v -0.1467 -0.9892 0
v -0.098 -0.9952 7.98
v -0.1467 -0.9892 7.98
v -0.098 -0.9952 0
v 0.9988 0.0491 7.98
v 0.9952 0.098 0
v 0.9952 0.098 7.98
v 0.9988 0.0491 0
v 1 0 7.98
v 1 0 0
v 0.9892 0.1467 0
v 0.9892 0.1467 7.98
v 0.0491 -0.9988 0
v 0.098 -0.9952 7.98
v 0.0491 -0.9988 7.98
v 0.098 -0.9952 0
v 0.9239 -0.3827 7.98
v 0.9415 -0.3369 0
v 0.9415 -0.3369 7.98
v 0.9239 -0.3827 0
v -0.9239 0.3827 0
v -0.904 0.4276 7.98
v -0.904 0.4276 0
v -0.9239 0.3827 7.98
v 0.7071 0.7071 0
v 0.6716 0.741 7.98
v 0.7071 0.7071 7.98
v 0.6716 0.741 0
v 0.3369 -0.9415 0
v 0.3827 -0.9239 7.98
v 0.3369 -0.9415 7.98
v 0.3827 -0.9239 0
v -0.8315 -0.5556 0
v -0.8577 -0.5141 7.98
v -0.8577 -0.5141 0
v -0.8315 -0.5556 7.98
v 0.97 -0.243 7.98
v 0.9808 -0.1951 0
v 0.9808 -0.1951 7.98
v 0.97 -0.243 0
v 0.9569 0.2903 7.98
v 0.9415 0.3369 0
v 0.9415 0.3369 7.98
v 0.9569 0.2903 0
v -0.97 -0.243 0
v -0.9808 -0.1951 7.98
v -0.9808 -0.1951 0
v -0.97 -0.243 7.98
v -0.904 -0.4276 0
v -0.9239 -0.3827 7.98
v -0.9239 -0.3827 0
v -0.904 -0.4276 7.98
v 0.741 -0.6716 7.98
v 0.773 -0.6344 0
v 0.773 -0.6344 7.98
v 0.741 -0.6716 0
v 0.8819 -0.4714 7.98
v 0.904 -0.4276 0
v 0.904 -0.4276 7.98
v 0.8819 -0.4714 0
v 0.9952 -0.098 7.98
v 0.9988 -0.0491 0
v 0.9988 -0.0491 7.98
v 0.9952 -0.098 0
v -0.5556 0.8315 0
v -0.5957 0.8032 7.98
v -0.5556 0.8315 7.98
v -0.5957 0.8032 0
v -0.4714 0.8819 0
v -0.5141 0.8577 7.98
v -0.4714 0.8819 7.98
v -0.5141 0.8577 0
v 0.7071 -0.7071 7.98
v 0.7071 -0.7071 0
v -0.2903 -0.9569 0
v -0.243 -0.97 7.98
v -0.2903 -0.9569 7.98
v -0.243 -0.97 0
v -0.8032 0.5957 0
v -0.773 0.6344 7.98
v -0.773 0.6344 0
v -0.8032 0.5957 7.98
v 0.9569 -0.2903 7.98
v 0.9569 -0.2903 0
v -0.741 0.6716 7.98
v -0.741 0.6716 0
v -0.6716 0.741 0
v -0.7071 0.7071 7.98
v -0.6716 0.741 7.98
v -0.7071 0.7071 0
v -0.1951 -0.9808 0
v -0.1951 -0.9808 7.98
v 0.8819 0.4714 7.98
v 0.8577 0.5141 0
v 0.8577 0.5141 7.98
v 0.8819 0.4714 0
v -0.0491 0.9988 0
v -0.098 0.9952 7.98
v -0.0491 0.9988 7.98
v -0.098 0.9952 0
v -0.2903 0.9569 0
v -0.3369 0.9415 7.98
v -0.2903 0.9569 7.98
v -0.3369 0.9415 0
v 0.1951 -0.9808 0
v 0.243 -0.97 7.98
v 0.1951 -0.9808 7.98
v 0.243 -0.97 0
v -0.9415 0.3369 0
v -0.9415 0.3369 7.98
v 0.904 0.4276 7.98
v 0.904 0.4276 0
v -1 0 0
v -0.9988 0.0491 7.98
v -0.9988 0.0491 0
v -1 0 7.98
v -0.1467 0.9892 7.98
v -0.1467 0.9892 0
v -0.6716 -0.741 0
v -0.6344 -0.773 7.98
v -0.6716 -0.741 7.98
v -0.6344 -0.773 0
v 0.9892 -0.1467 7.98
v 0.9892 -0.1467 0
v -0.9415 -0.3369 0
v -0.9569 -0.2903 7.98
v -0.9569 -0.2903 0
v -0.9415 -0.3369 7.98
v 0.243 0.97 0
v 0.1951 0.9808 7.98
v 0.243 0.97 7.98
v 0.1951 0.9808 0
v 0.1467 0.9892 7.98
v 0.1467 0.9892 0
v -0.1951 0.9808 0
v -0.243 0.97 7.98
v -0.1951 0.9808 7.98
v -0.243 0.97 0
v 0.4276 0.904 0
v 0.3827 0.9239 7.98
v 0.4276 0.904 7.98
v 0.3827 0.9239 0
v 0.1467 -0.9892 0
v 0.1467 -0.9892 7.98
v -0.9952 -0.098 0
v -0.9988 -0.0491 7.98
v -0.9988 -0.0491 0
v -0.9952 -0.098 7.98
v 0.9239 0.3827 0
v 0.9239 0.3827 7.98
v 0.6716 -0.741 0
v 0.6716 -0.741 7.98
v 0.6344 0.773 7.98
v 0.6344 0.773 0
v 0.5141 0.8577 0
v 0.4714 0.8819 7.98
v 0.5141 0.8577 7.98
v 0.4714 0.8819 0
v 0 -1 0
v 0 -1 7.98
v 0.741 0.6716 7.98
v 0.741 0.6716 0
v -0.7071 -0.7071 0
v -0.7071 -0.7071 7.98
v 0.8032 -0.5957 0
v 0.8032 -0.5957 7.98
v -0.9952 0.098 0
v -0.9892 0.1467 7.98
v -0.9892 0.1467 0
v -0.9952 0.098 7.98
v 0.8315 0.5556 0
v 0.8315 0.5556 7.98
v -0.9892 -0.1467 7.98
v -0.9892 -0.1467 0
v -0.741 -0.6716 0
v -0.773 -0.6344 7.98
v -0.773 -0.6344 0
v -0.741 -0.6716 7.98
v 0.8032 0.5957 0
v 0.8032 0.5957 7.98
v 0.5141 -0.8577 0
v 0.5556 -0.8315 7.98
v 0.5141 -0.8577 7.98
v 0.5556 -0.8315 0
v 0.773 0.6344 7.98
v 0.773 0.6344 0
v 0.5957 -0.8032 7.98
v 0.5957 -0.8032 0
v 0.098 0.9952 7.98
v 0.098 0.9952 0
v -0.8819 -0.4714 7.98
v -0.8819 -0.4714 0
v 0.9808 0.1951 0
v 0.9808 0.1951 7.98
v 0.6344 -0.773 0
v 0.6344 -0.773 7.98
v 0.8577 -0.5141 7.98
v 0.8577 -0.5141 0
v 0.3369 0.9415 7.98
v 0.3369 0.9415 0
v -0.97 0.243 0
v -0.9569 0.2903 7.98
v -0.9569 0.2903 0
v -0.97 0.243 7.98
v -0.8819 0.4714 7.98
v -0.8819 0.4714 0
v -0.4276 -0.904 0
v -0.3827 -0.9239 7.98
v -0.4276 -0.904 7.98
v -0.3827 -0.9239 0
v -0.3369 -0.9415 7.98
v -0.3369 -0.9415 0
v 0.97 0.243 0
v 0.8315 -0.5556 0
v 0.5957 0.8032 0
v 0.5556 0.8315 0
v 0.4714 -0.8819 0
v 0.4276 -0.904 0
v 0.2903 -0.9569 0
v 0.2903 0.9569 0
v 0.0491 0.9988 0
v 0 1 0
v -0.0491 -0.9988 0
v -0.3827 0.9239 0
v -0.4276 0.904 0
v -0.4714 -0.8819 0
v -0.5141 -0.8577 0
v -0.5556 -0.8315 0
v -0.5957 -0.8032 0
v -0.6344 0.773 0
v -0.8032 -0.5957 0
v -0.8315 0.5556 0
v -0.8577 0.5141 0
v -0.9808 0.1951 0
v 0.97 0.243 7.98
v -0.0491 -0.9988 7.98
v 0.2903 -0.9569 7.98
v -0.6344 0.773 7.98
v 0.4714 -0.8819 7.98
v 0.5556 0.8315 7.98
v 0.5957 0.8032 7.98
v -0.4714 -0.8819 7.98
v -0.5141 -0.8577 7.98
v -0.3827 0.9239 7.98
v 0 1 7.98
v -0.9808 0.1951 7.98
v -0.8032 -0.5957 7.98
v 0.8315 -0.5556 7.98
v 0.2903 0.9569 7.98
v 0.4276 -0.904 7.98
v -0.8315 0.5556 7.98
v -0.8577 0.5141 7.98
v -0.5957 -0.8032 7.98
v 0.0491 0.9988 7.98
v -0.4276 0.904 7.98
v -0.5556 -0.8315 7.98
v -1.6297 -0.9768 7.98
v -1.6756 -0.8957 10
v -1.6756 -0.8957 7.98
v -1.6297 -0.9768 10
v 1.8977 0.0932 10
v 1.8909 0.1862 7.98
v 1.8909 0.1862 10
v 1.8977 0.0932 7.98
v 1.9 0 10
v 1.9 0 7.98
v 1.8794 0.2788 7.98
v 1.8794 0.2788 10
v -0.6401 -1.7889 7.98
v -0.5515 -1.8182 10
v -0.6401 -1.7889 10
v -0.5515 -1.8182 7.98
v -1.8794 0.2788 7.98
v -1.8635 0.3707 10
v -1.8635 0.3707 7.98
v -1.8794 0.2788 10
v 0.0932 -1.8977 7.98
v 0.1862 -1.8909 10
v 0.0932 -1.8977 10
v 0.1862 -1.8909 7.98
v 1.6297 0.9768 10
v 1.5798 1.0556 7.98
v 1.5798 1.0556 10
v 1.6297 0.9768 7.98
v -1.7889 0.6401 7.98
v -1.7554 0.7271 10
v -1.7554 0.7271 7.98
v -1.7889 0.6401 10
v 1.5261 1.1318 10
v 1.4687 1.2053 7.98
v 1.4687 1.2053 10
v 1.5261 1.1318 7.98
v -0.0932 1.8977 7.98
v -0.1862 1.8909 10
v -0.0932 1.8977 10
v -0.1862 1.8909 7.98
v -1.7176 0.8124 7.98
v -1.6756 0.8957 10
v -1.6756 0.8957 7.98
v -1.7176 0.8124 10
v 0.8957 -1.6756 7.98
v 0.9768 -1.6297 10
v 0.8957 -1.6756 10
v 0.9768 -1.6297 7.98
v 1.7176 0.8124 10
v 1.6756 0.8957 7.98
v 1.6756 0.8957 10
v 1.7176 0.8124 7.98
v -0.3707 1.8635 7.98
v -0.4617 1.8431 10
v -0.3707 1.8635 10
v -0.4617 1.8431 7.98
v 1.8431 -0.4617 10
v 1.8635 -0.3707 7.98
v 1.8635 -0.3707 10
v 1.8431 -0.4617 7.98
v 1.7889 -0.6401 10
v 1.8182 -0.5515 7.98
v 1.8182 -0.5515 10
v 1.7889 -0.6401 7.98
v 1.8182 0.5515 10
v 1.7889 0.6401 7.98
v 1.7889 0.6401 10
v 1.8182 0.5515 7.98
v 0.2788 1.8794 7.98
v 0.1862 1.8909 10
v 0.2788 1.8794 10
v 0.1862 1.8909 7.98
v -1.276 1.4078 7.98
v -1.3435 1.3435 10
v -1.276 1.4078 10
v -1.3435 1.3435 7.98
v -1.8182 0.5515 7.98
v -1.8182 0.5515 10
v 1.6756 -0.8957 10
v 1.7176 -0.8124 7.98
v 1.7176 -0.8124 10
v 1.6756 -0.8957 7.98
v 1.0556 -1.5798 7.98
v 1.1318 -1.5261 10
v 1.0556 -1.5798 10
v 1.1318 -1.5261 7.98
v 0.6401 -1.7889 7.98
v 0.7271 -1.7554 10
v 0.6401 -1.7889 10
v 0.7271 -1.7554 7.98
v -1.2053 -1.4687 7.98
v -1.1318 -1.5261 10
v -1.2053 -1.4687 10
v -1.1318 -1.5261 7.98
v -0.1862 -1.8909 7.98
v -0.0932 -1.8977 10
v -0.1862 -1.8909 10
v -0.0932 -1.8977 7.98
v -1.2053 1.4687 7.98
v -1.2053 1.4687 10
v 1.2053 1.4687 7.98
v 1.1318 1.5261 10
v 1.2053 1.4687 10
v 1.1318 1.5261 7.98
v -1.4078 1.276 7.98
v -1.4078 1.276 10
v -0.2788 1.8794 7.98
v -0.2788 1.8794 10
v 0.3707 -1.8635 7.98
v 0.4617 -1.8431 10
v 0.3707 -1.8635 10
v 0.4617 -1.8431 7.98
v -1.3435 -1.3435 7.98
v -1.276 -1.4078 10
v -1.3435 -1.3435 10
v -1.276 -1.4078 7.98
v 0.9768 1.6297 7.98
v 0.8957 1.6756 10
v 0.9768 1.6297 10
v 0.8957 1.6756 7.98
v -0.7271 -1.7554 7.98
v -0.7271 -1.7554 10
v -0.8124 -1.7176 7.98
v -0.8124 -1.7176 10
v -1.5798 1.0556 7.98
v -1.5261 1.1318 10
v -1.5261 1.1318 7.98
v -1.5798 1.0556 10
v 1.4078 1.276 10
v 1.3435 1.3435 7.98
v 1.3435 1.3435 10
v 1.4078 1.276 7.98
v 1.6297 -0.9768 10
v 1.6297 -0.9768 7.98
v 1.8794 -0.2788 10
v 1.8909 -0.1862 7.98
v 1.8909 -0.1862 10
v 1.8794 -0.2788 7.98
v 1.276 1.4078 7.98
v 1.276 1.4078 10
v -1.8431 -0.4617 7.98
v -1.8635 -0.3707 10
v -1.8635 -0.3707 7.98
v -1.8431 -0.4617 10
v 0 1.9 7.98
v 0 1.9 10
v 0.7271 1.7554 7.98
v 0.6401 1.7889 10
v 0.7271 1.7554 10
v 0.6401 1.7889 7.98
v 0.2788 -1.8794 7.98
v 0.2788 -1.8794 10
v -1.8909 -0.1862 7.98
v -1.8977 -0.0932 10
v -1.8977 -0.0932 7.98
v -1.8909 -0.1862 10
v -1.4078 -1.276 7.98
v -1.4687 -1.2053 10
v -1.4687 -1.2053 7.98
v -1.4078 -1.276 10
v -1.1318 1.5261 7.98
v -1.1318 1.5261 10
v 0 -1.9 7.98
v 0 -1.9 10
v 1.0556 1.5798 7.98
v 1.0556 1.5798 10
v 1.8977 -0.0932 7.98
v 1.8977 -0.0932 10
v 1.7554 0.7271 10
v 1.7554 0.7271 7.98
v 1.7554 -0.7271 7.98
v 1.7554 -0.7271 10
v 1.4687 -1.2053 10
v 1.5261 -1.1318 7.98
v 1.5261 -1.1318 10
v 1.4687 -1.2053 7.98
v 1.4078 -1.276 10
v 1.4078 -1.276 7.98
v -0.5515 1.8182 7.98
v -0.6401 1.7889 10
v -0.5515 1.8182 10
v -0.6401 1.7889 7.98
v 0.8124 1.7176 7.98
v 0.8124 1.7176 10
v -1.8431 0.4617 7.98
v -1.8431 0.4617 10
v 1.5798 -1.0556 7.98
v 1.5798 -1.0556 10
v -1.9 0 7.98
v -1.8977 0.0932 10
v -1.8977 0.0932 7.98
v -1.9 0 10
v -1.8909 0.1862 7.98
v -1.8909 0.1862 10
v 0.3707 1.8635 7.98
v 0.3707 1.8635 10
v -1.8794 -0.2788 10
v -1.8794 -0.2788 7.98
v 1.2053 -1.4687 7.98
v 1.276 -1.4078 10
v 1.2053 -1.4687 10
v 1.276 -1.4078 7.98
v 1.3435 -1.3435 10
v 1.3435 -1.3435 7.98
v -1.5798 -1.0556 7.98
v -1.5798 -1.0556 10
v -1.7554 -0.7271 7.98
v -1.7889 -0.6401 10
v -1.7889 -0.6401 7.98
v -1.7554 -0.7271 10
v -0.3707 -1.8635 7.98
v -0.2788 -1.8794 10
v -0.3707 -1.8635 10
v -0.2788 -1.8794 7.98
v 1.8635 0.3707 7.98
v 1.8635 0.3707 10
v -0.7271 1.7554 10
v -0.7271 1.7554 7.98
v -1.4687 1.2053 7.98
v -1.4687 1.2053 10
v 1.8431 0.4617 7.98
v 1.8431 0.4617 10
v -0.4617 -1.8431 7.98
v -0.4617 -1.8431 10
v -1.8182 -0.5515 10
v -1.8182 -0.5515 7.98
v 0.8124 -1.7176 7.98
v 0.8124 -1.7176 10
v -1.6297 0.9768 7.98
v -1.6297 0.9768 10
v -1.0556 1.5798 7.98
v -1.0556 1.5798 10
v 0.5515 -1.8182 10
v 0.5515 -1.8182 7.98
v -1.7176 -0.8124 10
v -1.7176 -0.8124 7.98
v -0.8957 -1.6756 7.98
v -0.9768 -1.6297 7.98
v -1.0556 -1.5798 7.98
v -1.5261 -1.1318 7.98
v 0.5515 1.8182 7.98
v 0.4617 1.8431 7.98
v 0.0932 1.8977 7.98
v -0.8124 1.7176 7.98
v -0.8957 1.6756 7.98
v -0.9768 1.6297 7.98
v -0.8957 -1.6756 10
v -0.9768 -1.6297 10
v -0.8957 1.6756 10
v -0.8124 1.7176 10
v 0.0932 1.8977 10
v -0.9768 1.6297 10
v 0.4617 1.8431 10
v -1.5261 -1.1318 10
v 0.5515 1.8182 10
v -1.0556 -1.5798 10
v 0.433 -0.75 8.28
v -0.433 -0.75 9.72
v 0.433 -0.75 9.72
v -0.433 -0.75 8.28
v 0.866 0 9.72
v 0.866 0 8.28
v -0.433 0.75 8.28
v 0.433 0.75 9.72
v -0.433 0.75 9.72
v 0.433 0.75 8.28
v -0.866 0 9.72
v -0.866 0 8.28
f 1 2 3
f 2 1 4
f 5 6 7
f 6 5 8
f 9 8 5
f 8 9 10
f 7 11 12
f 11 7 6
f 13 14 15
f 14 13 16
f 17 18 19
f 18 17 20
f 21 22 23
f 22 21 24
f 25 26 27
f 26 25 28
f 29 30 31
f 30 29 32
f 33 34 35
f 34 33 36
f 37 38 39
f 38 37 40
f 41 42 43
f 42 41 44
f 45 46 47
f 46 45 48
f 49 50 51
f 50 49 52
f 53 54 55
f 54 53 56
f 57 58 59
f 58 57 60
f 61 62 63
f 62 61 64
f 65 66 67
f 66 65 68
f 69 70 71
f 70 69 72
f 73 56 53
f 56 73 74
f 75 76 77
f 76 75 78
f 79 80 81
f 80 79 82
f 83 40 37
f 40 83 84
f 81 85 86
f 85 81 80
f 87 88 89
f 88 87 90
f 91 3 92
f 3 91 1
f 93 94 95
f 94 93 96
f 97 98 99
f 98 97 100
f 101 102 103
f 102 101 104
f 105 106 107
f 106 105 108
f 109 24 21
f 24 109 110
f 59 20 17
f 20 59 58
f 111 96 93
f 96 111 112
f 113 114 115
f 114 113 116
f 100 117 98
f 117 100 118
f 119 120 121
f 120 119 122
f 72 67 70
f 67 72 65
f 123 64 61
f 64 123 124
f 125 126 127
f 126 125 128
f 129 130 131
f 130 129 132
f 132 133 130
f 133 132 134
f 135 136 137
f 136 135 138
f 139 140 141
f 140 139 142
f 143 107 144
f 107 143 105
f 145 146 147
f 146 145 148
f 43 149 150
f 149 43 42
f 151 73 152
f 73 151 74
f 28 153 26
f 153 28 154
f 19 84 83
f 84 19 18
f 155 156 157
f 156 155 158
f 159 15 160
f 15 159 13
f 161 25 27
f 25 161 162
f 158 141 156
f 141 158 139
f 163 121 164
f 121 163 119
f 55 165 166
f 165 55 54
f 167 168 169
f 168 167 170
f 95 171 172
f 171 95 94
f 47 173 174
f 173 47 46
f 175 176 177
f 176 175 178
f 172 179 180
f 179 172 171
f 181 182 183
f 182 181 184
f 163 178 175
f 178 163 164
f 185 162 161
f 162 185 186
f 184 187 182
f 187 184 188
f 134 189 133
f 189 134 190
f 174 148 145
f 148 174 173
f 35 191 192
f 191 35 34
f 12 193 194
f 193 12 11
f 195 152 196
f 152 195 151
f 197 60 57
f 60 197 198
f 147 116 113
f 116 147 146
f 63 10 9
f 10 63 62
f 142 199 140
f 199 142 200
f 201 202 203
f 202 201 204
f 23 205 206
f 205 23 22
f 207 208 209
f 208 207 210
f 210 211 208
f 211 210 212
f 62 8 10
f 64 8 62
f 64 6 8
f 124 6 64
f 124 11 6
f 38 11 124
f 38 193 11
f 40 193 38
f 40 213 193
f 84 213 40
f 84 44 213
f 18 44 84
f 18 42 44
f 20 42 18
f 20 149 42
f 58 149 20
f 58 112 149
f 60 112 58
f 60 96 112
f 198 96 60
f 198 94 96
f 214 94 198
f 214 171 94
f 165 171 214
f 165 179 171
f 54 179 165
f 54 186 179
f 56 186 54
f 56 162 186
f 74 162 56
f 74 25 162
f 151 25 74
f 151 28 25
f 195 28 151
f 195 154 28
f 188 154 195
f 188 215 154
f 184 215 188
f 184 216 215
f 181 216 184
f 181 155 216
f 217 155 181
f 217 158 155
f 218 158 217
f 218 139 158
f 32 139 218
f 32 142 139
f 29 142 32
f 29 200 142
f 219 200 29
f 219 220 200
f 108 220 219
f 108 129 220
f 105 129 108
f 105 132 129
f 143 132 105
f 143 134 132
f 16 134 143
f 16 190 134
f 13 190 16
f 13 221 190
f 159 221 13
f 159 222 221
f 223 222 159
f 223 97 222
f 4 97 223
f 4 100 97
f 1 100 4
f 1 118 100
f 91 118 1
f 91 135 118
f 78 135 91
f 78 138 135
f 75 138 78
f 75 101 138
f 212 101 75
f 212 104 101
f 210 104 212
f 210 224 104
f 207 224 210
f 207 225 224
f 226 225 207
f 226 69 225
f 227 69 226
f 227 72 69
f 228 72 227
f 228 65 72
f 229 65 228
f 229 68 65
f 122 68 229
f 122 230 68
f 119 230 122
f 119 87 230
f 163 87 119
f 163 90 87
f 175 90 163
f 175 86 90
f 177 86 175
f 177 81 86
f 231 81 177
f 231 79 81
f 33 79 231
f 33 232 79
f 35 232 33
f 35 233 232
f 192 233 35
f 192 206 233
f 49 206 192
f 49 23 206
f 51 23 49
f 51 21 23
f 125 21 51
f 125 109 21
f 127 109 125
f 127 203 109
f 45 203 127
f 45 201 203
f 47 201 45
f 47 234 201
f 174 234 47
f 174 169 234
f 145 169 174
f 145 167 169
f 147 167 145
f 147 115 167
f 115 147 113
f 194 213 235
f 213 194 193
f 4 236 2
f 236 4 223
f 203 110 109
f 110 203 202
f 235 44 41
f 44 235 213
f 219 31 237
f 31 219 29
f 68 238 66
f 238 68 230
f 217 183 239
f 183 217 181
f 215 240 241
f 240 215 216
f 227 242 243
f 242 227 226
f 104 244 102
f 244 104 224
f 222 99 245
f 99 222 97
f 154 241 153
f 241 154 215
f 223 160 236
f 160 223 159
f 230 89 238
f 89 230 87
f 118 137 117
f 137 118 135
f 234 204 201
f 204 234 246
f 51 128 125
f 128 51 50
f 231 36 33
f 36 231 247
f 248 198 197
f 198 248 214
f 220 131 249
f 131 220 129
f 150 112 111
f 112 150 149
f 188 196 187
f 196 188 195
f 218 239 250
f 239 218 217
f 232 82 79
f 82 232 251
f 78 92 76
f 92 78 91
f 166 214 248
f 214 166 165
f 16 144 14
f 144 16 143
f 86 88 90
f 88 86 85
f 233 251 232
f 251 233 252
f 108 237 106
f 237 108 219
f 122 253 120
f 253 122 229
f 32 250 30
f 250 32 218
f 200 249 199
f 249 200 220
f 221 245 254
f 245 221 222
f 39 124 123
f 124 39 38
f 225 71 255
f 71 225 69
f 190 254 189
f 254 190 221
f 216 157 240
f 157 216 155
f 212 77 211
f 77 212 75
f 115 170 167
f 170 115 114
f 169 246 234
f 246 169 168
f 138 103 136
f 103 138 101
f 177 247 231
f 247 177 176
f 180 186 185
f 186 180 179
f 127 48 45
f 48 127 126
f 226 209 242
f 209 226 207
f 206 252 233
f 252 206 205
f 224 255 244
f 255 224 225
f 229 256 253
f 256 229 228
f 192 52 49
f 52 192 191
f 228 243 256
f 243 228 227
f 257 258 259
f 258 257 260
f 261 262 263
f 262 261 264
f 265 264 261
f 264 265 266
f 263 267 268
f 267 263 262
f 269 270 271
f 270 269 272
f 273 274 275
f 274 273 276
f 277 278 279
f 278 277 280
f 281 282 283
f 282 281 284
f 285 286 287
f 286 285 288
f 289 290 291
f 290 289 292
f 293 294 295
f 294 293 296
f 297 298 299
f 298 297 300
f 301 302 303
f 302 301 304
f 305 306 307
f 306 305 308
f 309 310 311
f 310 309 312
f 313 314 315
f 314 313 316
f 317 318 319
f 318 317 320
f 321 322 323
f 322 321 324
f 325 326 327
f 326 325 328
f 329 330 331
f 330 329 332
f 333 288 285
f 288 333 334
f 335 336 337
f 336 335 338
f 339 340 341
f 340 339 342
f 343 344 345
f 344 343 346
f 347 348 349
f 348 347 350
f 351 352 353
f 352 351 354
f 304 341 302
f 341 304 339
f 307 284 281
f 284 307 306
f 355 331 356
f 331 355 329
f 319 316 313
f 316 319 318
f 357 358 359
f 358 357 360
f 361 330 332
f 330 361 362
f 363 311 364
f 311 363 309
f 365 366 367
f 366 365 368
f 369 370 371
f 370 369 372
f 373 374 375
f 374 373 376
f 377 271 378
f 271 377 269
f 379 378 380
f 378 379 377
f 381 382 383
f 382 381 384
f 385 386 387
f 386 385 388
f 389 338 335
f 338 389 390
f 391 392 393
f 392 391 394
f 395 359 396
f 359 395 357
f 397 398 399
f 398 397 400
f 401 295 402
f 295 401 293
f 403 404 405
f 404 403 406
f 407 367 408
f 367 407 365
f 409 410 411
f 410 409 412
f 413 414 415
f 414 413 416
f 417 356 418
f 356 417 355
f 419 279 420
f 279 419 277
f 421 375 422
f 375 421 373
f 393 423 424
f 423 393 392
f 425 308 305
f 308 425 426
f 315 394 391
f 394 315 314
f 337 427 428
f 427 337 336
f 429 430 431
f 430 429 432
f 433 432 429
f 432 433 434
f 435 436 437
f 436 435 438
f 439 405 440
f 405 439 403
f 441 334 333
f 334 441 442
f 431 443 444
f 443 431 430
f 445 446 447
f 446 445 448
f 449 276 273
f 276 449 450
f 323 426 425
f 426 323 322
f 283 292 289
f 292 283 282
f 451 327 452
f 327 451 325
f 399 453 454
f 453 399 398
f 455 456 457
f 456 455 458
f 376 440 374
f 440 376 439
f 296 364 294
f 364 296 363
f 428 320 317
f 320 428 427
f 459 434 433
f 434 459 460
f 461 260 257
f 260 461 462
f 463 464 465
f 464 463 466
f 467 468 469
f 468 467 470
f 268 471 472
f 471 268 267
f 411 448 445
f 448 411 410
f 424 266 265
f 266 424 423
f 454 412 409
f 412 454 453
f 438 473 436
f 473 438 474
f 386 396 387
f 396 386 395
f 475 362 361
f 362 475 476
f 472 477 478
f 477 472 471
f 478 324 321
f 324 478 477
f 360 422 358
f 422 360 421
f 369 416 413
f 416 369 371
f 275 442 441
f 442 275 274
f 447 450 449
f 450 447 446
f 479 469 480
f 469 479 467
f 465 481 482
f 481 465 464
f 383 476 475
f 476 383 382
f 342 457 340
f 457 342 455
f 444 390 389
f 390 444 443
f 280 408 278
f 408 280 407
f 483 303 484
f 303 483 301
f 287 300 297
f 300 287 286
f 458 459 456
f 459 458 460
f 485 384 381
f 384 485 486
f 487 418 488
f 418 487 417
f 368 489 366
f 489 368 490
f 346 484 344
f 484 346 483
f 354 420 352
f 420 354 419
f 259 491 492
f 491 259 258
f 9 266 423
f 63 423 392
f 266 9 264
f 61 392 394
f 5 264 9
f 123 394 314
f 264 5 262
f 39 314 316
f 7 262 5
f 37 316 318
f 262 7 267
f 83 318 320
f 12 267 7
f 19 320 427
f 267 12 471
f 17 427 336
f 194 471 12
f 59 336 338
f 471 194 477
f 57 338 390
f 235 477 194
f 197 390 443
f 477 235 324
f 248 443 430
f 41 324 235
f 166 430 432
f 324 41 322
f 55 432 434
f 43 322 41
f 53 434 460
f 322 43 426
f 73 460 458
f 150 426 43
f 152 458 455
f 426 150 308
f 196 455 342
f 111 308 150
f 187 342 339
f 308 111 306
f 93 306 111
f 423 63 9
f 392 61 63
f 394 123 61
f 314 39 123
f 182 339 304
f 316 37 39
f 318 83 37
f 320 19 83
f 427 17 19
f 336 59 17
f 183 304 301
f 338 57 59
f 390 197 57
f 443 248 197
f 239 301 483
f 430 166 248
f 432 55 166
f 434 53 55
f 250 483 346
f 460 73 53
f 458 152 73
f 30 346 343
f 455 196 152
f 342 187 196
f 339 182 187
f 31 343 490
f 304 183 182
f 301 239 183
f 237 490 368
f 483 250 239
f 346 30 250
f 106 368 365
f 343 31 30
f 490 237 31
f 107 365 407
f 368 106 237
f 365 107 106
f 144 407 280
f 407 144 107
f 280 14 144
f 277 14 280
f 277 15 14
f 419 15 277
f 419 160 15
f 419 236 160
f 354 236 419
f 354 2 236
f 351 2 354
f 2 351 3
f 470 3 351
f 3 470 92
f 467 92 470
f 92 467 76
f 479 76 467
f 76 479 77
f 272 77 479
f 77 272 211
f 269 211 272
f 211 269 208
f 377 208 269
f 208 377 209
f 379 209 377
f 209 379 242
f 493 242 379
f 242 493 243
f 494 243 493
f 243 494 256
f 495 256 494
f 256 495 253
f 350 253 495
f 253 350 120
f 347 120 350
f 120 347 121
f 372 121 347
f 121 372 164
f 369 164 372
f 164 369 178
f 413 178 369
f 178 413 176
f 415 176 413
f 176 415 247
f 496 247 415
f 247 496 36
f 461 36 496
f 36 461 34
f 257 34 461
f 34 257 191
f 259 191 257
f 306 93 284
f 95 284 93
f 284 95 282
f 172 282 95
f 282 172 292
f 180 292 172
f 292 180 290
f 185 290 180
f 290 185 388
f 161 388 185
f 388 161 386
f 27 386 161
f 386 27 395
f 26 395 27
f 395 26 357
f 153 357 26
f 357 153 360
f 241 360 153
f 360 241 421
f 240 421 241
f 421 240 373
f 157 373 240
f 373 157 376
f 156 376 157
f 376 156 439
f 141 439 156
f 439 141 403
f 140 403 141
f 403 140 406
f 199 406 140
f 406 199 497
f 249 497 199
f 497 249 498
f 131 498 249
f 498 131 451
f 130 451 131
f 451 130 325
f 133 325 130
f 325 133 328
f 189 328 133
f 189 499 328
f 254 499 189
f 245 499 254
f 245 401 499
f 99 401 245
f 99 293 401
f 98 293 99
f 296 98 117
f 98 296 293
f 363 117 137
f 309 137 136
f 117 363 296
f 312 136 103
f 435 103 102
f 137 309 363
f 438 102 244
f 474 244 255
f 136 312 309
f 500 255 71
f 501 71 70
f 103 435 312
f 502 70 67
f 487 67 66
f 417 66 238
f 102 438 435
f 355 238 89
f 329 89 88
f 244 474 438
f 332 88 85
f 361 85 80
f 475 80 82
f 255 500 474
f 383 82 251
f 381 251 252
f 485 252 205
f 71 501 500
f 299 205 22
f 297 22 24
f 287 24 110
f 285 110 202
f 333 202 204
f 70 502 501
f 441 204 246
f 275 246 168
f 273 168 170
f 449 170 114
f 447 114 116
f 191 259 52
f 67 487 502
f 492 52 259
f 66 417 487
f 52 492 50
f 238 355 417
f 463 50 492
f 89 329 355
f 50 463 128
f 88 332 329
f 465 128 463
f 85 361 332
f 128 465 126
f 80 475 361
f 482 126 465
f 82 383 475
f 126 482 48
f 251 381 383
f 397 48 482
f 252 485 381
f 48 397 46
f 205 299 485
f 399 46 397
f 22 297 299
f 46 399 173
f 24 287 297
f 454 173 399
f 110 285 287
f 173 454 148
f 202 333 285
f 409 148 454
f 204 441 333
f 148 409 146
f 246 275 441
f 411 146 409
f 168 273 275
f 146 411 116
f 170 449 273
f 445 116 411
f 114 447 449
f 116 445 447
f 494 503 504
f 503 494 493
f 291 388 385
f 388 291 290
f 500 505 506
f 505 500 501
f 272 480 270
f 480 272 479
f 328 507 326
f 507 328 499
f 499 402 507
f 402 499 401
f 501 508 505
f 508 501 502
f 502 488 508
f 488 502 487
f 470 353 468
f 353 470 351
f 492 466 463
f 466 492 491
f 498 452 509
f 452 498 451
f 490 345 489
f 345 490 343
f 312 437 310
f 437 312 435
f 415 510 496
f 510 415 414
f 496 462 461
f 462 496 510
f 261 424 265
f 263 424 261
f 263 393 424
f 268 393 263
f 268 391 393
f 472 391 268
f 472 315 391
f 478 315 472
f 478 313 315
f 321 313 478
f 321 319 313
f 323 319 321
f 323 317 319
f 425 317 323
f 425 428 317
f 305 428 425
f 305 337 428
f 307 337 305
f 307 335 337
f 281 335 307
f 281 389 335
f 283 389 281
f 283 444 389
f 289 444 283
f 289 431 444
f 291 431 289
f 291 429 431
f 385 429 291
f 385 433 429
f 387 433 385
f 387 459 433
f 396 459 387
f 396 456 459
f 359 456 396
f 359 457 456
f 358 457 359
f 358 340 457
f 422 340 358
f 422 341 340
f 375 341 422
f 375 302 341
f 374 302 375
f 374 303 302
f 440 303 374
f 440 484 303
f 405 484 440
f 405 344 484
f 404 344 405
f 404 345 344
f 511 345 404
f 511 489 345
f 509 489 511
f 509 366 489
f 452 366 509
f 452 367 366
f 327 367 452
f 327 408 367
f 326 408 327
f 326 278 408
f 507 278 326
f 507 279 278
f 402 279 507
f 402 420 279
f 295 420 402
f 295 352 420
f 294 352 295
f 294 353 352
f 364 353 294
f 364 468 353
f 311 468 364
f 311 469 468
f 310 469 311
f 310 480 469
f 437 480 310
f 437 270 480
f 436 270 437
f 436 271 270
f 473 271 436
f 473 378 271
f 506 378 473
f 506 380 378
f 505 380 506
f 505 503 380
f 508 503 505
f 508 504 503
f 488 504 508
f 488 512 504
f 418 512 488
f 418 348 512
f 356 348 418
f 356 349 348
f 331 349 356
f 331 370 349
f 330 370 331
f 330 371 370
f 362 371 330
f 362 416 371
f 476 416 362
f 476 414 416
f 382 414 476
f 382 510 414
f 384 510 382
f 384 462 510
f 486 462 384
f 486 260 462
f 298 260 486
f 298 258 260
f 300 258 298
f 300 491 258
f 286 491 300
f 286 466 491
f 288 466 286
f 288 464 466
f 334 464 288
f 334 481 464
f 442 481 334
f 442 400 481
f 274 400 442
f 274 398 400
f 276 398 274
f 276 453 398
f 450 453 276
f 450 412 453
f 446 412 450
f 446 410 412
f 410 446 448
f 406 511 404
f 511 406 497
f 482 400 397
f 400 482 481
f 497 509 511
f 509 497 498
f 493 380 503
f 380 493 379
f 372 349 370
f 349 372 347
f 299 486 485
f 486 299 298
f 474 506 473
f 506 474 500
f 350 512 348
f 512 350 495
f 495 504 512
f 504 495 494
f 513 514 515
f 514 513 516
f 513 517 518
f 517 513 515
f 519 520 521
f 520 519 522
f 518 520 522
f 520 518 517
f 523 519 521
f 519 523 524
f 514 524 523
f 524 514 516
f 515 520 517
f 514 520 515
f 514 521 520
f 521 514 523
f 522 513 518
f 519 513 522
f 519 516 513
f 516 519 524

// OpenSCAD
// Socket head cap screw (M2-like) with internal hex socket
// Dimensions: shank Ø2.0, head Ø3.8, head height 2.0, overall length 10.0

$fn = 128;

// Parameters (mm)
shank_diameter = 2.0;
overall_length = 10.0;

head_diameter = 3.8;
head_height   = 2.0;

// Hex socket (across flats) and depth (kept within head height)
hex_socket_af    = 1.5;
hex_socket_depth = 1.4;   // <= head_height
socket_top_wall  = 0.3;   // material above socket

// Small overlap to avoid coplanar faces in boolean ops
eps = 0.02;

// Derived
shank_length = overall_length - head_height;

// Hex prism by across-flats
module hex_prism_af(af, h, center=false) {
    // For a regular hexagon: across flats = sqrt(3) * R (circumradius)
    R = af / sqrt(3);
    cylinder(h=h, r=R, $fn=6, center=center);
}

module socket_head_cap_screw() {
    difference() {
        // ONE connected solid: shank + cylindrical head
        union() {
            // Shank
            cylinder(d=shank_diameter, h=shank_length + eps, center=false);

            // Head, connected at z = shank_length (slight overlap via eps)
            translate([0, 0, shank_length - eps])
                cylinder(d=head_diameter, h=head_height + eps, center=false);
        }

        // Internal hex socket cut from the top of the head downward
        // Top of head at z = overall_length
        socket_depth = min(hex_socket_depth, head_height - socket_top_wall);
        socket_z0 = overall_length - socket_top_wall - socket_depth;

        translate([0, 0, socket_z0 - eps])
            hex_prism_af(hex_socket_af, socket_depth + 2*eps, center=false);
    }
}

socket_head_cap_screw();
